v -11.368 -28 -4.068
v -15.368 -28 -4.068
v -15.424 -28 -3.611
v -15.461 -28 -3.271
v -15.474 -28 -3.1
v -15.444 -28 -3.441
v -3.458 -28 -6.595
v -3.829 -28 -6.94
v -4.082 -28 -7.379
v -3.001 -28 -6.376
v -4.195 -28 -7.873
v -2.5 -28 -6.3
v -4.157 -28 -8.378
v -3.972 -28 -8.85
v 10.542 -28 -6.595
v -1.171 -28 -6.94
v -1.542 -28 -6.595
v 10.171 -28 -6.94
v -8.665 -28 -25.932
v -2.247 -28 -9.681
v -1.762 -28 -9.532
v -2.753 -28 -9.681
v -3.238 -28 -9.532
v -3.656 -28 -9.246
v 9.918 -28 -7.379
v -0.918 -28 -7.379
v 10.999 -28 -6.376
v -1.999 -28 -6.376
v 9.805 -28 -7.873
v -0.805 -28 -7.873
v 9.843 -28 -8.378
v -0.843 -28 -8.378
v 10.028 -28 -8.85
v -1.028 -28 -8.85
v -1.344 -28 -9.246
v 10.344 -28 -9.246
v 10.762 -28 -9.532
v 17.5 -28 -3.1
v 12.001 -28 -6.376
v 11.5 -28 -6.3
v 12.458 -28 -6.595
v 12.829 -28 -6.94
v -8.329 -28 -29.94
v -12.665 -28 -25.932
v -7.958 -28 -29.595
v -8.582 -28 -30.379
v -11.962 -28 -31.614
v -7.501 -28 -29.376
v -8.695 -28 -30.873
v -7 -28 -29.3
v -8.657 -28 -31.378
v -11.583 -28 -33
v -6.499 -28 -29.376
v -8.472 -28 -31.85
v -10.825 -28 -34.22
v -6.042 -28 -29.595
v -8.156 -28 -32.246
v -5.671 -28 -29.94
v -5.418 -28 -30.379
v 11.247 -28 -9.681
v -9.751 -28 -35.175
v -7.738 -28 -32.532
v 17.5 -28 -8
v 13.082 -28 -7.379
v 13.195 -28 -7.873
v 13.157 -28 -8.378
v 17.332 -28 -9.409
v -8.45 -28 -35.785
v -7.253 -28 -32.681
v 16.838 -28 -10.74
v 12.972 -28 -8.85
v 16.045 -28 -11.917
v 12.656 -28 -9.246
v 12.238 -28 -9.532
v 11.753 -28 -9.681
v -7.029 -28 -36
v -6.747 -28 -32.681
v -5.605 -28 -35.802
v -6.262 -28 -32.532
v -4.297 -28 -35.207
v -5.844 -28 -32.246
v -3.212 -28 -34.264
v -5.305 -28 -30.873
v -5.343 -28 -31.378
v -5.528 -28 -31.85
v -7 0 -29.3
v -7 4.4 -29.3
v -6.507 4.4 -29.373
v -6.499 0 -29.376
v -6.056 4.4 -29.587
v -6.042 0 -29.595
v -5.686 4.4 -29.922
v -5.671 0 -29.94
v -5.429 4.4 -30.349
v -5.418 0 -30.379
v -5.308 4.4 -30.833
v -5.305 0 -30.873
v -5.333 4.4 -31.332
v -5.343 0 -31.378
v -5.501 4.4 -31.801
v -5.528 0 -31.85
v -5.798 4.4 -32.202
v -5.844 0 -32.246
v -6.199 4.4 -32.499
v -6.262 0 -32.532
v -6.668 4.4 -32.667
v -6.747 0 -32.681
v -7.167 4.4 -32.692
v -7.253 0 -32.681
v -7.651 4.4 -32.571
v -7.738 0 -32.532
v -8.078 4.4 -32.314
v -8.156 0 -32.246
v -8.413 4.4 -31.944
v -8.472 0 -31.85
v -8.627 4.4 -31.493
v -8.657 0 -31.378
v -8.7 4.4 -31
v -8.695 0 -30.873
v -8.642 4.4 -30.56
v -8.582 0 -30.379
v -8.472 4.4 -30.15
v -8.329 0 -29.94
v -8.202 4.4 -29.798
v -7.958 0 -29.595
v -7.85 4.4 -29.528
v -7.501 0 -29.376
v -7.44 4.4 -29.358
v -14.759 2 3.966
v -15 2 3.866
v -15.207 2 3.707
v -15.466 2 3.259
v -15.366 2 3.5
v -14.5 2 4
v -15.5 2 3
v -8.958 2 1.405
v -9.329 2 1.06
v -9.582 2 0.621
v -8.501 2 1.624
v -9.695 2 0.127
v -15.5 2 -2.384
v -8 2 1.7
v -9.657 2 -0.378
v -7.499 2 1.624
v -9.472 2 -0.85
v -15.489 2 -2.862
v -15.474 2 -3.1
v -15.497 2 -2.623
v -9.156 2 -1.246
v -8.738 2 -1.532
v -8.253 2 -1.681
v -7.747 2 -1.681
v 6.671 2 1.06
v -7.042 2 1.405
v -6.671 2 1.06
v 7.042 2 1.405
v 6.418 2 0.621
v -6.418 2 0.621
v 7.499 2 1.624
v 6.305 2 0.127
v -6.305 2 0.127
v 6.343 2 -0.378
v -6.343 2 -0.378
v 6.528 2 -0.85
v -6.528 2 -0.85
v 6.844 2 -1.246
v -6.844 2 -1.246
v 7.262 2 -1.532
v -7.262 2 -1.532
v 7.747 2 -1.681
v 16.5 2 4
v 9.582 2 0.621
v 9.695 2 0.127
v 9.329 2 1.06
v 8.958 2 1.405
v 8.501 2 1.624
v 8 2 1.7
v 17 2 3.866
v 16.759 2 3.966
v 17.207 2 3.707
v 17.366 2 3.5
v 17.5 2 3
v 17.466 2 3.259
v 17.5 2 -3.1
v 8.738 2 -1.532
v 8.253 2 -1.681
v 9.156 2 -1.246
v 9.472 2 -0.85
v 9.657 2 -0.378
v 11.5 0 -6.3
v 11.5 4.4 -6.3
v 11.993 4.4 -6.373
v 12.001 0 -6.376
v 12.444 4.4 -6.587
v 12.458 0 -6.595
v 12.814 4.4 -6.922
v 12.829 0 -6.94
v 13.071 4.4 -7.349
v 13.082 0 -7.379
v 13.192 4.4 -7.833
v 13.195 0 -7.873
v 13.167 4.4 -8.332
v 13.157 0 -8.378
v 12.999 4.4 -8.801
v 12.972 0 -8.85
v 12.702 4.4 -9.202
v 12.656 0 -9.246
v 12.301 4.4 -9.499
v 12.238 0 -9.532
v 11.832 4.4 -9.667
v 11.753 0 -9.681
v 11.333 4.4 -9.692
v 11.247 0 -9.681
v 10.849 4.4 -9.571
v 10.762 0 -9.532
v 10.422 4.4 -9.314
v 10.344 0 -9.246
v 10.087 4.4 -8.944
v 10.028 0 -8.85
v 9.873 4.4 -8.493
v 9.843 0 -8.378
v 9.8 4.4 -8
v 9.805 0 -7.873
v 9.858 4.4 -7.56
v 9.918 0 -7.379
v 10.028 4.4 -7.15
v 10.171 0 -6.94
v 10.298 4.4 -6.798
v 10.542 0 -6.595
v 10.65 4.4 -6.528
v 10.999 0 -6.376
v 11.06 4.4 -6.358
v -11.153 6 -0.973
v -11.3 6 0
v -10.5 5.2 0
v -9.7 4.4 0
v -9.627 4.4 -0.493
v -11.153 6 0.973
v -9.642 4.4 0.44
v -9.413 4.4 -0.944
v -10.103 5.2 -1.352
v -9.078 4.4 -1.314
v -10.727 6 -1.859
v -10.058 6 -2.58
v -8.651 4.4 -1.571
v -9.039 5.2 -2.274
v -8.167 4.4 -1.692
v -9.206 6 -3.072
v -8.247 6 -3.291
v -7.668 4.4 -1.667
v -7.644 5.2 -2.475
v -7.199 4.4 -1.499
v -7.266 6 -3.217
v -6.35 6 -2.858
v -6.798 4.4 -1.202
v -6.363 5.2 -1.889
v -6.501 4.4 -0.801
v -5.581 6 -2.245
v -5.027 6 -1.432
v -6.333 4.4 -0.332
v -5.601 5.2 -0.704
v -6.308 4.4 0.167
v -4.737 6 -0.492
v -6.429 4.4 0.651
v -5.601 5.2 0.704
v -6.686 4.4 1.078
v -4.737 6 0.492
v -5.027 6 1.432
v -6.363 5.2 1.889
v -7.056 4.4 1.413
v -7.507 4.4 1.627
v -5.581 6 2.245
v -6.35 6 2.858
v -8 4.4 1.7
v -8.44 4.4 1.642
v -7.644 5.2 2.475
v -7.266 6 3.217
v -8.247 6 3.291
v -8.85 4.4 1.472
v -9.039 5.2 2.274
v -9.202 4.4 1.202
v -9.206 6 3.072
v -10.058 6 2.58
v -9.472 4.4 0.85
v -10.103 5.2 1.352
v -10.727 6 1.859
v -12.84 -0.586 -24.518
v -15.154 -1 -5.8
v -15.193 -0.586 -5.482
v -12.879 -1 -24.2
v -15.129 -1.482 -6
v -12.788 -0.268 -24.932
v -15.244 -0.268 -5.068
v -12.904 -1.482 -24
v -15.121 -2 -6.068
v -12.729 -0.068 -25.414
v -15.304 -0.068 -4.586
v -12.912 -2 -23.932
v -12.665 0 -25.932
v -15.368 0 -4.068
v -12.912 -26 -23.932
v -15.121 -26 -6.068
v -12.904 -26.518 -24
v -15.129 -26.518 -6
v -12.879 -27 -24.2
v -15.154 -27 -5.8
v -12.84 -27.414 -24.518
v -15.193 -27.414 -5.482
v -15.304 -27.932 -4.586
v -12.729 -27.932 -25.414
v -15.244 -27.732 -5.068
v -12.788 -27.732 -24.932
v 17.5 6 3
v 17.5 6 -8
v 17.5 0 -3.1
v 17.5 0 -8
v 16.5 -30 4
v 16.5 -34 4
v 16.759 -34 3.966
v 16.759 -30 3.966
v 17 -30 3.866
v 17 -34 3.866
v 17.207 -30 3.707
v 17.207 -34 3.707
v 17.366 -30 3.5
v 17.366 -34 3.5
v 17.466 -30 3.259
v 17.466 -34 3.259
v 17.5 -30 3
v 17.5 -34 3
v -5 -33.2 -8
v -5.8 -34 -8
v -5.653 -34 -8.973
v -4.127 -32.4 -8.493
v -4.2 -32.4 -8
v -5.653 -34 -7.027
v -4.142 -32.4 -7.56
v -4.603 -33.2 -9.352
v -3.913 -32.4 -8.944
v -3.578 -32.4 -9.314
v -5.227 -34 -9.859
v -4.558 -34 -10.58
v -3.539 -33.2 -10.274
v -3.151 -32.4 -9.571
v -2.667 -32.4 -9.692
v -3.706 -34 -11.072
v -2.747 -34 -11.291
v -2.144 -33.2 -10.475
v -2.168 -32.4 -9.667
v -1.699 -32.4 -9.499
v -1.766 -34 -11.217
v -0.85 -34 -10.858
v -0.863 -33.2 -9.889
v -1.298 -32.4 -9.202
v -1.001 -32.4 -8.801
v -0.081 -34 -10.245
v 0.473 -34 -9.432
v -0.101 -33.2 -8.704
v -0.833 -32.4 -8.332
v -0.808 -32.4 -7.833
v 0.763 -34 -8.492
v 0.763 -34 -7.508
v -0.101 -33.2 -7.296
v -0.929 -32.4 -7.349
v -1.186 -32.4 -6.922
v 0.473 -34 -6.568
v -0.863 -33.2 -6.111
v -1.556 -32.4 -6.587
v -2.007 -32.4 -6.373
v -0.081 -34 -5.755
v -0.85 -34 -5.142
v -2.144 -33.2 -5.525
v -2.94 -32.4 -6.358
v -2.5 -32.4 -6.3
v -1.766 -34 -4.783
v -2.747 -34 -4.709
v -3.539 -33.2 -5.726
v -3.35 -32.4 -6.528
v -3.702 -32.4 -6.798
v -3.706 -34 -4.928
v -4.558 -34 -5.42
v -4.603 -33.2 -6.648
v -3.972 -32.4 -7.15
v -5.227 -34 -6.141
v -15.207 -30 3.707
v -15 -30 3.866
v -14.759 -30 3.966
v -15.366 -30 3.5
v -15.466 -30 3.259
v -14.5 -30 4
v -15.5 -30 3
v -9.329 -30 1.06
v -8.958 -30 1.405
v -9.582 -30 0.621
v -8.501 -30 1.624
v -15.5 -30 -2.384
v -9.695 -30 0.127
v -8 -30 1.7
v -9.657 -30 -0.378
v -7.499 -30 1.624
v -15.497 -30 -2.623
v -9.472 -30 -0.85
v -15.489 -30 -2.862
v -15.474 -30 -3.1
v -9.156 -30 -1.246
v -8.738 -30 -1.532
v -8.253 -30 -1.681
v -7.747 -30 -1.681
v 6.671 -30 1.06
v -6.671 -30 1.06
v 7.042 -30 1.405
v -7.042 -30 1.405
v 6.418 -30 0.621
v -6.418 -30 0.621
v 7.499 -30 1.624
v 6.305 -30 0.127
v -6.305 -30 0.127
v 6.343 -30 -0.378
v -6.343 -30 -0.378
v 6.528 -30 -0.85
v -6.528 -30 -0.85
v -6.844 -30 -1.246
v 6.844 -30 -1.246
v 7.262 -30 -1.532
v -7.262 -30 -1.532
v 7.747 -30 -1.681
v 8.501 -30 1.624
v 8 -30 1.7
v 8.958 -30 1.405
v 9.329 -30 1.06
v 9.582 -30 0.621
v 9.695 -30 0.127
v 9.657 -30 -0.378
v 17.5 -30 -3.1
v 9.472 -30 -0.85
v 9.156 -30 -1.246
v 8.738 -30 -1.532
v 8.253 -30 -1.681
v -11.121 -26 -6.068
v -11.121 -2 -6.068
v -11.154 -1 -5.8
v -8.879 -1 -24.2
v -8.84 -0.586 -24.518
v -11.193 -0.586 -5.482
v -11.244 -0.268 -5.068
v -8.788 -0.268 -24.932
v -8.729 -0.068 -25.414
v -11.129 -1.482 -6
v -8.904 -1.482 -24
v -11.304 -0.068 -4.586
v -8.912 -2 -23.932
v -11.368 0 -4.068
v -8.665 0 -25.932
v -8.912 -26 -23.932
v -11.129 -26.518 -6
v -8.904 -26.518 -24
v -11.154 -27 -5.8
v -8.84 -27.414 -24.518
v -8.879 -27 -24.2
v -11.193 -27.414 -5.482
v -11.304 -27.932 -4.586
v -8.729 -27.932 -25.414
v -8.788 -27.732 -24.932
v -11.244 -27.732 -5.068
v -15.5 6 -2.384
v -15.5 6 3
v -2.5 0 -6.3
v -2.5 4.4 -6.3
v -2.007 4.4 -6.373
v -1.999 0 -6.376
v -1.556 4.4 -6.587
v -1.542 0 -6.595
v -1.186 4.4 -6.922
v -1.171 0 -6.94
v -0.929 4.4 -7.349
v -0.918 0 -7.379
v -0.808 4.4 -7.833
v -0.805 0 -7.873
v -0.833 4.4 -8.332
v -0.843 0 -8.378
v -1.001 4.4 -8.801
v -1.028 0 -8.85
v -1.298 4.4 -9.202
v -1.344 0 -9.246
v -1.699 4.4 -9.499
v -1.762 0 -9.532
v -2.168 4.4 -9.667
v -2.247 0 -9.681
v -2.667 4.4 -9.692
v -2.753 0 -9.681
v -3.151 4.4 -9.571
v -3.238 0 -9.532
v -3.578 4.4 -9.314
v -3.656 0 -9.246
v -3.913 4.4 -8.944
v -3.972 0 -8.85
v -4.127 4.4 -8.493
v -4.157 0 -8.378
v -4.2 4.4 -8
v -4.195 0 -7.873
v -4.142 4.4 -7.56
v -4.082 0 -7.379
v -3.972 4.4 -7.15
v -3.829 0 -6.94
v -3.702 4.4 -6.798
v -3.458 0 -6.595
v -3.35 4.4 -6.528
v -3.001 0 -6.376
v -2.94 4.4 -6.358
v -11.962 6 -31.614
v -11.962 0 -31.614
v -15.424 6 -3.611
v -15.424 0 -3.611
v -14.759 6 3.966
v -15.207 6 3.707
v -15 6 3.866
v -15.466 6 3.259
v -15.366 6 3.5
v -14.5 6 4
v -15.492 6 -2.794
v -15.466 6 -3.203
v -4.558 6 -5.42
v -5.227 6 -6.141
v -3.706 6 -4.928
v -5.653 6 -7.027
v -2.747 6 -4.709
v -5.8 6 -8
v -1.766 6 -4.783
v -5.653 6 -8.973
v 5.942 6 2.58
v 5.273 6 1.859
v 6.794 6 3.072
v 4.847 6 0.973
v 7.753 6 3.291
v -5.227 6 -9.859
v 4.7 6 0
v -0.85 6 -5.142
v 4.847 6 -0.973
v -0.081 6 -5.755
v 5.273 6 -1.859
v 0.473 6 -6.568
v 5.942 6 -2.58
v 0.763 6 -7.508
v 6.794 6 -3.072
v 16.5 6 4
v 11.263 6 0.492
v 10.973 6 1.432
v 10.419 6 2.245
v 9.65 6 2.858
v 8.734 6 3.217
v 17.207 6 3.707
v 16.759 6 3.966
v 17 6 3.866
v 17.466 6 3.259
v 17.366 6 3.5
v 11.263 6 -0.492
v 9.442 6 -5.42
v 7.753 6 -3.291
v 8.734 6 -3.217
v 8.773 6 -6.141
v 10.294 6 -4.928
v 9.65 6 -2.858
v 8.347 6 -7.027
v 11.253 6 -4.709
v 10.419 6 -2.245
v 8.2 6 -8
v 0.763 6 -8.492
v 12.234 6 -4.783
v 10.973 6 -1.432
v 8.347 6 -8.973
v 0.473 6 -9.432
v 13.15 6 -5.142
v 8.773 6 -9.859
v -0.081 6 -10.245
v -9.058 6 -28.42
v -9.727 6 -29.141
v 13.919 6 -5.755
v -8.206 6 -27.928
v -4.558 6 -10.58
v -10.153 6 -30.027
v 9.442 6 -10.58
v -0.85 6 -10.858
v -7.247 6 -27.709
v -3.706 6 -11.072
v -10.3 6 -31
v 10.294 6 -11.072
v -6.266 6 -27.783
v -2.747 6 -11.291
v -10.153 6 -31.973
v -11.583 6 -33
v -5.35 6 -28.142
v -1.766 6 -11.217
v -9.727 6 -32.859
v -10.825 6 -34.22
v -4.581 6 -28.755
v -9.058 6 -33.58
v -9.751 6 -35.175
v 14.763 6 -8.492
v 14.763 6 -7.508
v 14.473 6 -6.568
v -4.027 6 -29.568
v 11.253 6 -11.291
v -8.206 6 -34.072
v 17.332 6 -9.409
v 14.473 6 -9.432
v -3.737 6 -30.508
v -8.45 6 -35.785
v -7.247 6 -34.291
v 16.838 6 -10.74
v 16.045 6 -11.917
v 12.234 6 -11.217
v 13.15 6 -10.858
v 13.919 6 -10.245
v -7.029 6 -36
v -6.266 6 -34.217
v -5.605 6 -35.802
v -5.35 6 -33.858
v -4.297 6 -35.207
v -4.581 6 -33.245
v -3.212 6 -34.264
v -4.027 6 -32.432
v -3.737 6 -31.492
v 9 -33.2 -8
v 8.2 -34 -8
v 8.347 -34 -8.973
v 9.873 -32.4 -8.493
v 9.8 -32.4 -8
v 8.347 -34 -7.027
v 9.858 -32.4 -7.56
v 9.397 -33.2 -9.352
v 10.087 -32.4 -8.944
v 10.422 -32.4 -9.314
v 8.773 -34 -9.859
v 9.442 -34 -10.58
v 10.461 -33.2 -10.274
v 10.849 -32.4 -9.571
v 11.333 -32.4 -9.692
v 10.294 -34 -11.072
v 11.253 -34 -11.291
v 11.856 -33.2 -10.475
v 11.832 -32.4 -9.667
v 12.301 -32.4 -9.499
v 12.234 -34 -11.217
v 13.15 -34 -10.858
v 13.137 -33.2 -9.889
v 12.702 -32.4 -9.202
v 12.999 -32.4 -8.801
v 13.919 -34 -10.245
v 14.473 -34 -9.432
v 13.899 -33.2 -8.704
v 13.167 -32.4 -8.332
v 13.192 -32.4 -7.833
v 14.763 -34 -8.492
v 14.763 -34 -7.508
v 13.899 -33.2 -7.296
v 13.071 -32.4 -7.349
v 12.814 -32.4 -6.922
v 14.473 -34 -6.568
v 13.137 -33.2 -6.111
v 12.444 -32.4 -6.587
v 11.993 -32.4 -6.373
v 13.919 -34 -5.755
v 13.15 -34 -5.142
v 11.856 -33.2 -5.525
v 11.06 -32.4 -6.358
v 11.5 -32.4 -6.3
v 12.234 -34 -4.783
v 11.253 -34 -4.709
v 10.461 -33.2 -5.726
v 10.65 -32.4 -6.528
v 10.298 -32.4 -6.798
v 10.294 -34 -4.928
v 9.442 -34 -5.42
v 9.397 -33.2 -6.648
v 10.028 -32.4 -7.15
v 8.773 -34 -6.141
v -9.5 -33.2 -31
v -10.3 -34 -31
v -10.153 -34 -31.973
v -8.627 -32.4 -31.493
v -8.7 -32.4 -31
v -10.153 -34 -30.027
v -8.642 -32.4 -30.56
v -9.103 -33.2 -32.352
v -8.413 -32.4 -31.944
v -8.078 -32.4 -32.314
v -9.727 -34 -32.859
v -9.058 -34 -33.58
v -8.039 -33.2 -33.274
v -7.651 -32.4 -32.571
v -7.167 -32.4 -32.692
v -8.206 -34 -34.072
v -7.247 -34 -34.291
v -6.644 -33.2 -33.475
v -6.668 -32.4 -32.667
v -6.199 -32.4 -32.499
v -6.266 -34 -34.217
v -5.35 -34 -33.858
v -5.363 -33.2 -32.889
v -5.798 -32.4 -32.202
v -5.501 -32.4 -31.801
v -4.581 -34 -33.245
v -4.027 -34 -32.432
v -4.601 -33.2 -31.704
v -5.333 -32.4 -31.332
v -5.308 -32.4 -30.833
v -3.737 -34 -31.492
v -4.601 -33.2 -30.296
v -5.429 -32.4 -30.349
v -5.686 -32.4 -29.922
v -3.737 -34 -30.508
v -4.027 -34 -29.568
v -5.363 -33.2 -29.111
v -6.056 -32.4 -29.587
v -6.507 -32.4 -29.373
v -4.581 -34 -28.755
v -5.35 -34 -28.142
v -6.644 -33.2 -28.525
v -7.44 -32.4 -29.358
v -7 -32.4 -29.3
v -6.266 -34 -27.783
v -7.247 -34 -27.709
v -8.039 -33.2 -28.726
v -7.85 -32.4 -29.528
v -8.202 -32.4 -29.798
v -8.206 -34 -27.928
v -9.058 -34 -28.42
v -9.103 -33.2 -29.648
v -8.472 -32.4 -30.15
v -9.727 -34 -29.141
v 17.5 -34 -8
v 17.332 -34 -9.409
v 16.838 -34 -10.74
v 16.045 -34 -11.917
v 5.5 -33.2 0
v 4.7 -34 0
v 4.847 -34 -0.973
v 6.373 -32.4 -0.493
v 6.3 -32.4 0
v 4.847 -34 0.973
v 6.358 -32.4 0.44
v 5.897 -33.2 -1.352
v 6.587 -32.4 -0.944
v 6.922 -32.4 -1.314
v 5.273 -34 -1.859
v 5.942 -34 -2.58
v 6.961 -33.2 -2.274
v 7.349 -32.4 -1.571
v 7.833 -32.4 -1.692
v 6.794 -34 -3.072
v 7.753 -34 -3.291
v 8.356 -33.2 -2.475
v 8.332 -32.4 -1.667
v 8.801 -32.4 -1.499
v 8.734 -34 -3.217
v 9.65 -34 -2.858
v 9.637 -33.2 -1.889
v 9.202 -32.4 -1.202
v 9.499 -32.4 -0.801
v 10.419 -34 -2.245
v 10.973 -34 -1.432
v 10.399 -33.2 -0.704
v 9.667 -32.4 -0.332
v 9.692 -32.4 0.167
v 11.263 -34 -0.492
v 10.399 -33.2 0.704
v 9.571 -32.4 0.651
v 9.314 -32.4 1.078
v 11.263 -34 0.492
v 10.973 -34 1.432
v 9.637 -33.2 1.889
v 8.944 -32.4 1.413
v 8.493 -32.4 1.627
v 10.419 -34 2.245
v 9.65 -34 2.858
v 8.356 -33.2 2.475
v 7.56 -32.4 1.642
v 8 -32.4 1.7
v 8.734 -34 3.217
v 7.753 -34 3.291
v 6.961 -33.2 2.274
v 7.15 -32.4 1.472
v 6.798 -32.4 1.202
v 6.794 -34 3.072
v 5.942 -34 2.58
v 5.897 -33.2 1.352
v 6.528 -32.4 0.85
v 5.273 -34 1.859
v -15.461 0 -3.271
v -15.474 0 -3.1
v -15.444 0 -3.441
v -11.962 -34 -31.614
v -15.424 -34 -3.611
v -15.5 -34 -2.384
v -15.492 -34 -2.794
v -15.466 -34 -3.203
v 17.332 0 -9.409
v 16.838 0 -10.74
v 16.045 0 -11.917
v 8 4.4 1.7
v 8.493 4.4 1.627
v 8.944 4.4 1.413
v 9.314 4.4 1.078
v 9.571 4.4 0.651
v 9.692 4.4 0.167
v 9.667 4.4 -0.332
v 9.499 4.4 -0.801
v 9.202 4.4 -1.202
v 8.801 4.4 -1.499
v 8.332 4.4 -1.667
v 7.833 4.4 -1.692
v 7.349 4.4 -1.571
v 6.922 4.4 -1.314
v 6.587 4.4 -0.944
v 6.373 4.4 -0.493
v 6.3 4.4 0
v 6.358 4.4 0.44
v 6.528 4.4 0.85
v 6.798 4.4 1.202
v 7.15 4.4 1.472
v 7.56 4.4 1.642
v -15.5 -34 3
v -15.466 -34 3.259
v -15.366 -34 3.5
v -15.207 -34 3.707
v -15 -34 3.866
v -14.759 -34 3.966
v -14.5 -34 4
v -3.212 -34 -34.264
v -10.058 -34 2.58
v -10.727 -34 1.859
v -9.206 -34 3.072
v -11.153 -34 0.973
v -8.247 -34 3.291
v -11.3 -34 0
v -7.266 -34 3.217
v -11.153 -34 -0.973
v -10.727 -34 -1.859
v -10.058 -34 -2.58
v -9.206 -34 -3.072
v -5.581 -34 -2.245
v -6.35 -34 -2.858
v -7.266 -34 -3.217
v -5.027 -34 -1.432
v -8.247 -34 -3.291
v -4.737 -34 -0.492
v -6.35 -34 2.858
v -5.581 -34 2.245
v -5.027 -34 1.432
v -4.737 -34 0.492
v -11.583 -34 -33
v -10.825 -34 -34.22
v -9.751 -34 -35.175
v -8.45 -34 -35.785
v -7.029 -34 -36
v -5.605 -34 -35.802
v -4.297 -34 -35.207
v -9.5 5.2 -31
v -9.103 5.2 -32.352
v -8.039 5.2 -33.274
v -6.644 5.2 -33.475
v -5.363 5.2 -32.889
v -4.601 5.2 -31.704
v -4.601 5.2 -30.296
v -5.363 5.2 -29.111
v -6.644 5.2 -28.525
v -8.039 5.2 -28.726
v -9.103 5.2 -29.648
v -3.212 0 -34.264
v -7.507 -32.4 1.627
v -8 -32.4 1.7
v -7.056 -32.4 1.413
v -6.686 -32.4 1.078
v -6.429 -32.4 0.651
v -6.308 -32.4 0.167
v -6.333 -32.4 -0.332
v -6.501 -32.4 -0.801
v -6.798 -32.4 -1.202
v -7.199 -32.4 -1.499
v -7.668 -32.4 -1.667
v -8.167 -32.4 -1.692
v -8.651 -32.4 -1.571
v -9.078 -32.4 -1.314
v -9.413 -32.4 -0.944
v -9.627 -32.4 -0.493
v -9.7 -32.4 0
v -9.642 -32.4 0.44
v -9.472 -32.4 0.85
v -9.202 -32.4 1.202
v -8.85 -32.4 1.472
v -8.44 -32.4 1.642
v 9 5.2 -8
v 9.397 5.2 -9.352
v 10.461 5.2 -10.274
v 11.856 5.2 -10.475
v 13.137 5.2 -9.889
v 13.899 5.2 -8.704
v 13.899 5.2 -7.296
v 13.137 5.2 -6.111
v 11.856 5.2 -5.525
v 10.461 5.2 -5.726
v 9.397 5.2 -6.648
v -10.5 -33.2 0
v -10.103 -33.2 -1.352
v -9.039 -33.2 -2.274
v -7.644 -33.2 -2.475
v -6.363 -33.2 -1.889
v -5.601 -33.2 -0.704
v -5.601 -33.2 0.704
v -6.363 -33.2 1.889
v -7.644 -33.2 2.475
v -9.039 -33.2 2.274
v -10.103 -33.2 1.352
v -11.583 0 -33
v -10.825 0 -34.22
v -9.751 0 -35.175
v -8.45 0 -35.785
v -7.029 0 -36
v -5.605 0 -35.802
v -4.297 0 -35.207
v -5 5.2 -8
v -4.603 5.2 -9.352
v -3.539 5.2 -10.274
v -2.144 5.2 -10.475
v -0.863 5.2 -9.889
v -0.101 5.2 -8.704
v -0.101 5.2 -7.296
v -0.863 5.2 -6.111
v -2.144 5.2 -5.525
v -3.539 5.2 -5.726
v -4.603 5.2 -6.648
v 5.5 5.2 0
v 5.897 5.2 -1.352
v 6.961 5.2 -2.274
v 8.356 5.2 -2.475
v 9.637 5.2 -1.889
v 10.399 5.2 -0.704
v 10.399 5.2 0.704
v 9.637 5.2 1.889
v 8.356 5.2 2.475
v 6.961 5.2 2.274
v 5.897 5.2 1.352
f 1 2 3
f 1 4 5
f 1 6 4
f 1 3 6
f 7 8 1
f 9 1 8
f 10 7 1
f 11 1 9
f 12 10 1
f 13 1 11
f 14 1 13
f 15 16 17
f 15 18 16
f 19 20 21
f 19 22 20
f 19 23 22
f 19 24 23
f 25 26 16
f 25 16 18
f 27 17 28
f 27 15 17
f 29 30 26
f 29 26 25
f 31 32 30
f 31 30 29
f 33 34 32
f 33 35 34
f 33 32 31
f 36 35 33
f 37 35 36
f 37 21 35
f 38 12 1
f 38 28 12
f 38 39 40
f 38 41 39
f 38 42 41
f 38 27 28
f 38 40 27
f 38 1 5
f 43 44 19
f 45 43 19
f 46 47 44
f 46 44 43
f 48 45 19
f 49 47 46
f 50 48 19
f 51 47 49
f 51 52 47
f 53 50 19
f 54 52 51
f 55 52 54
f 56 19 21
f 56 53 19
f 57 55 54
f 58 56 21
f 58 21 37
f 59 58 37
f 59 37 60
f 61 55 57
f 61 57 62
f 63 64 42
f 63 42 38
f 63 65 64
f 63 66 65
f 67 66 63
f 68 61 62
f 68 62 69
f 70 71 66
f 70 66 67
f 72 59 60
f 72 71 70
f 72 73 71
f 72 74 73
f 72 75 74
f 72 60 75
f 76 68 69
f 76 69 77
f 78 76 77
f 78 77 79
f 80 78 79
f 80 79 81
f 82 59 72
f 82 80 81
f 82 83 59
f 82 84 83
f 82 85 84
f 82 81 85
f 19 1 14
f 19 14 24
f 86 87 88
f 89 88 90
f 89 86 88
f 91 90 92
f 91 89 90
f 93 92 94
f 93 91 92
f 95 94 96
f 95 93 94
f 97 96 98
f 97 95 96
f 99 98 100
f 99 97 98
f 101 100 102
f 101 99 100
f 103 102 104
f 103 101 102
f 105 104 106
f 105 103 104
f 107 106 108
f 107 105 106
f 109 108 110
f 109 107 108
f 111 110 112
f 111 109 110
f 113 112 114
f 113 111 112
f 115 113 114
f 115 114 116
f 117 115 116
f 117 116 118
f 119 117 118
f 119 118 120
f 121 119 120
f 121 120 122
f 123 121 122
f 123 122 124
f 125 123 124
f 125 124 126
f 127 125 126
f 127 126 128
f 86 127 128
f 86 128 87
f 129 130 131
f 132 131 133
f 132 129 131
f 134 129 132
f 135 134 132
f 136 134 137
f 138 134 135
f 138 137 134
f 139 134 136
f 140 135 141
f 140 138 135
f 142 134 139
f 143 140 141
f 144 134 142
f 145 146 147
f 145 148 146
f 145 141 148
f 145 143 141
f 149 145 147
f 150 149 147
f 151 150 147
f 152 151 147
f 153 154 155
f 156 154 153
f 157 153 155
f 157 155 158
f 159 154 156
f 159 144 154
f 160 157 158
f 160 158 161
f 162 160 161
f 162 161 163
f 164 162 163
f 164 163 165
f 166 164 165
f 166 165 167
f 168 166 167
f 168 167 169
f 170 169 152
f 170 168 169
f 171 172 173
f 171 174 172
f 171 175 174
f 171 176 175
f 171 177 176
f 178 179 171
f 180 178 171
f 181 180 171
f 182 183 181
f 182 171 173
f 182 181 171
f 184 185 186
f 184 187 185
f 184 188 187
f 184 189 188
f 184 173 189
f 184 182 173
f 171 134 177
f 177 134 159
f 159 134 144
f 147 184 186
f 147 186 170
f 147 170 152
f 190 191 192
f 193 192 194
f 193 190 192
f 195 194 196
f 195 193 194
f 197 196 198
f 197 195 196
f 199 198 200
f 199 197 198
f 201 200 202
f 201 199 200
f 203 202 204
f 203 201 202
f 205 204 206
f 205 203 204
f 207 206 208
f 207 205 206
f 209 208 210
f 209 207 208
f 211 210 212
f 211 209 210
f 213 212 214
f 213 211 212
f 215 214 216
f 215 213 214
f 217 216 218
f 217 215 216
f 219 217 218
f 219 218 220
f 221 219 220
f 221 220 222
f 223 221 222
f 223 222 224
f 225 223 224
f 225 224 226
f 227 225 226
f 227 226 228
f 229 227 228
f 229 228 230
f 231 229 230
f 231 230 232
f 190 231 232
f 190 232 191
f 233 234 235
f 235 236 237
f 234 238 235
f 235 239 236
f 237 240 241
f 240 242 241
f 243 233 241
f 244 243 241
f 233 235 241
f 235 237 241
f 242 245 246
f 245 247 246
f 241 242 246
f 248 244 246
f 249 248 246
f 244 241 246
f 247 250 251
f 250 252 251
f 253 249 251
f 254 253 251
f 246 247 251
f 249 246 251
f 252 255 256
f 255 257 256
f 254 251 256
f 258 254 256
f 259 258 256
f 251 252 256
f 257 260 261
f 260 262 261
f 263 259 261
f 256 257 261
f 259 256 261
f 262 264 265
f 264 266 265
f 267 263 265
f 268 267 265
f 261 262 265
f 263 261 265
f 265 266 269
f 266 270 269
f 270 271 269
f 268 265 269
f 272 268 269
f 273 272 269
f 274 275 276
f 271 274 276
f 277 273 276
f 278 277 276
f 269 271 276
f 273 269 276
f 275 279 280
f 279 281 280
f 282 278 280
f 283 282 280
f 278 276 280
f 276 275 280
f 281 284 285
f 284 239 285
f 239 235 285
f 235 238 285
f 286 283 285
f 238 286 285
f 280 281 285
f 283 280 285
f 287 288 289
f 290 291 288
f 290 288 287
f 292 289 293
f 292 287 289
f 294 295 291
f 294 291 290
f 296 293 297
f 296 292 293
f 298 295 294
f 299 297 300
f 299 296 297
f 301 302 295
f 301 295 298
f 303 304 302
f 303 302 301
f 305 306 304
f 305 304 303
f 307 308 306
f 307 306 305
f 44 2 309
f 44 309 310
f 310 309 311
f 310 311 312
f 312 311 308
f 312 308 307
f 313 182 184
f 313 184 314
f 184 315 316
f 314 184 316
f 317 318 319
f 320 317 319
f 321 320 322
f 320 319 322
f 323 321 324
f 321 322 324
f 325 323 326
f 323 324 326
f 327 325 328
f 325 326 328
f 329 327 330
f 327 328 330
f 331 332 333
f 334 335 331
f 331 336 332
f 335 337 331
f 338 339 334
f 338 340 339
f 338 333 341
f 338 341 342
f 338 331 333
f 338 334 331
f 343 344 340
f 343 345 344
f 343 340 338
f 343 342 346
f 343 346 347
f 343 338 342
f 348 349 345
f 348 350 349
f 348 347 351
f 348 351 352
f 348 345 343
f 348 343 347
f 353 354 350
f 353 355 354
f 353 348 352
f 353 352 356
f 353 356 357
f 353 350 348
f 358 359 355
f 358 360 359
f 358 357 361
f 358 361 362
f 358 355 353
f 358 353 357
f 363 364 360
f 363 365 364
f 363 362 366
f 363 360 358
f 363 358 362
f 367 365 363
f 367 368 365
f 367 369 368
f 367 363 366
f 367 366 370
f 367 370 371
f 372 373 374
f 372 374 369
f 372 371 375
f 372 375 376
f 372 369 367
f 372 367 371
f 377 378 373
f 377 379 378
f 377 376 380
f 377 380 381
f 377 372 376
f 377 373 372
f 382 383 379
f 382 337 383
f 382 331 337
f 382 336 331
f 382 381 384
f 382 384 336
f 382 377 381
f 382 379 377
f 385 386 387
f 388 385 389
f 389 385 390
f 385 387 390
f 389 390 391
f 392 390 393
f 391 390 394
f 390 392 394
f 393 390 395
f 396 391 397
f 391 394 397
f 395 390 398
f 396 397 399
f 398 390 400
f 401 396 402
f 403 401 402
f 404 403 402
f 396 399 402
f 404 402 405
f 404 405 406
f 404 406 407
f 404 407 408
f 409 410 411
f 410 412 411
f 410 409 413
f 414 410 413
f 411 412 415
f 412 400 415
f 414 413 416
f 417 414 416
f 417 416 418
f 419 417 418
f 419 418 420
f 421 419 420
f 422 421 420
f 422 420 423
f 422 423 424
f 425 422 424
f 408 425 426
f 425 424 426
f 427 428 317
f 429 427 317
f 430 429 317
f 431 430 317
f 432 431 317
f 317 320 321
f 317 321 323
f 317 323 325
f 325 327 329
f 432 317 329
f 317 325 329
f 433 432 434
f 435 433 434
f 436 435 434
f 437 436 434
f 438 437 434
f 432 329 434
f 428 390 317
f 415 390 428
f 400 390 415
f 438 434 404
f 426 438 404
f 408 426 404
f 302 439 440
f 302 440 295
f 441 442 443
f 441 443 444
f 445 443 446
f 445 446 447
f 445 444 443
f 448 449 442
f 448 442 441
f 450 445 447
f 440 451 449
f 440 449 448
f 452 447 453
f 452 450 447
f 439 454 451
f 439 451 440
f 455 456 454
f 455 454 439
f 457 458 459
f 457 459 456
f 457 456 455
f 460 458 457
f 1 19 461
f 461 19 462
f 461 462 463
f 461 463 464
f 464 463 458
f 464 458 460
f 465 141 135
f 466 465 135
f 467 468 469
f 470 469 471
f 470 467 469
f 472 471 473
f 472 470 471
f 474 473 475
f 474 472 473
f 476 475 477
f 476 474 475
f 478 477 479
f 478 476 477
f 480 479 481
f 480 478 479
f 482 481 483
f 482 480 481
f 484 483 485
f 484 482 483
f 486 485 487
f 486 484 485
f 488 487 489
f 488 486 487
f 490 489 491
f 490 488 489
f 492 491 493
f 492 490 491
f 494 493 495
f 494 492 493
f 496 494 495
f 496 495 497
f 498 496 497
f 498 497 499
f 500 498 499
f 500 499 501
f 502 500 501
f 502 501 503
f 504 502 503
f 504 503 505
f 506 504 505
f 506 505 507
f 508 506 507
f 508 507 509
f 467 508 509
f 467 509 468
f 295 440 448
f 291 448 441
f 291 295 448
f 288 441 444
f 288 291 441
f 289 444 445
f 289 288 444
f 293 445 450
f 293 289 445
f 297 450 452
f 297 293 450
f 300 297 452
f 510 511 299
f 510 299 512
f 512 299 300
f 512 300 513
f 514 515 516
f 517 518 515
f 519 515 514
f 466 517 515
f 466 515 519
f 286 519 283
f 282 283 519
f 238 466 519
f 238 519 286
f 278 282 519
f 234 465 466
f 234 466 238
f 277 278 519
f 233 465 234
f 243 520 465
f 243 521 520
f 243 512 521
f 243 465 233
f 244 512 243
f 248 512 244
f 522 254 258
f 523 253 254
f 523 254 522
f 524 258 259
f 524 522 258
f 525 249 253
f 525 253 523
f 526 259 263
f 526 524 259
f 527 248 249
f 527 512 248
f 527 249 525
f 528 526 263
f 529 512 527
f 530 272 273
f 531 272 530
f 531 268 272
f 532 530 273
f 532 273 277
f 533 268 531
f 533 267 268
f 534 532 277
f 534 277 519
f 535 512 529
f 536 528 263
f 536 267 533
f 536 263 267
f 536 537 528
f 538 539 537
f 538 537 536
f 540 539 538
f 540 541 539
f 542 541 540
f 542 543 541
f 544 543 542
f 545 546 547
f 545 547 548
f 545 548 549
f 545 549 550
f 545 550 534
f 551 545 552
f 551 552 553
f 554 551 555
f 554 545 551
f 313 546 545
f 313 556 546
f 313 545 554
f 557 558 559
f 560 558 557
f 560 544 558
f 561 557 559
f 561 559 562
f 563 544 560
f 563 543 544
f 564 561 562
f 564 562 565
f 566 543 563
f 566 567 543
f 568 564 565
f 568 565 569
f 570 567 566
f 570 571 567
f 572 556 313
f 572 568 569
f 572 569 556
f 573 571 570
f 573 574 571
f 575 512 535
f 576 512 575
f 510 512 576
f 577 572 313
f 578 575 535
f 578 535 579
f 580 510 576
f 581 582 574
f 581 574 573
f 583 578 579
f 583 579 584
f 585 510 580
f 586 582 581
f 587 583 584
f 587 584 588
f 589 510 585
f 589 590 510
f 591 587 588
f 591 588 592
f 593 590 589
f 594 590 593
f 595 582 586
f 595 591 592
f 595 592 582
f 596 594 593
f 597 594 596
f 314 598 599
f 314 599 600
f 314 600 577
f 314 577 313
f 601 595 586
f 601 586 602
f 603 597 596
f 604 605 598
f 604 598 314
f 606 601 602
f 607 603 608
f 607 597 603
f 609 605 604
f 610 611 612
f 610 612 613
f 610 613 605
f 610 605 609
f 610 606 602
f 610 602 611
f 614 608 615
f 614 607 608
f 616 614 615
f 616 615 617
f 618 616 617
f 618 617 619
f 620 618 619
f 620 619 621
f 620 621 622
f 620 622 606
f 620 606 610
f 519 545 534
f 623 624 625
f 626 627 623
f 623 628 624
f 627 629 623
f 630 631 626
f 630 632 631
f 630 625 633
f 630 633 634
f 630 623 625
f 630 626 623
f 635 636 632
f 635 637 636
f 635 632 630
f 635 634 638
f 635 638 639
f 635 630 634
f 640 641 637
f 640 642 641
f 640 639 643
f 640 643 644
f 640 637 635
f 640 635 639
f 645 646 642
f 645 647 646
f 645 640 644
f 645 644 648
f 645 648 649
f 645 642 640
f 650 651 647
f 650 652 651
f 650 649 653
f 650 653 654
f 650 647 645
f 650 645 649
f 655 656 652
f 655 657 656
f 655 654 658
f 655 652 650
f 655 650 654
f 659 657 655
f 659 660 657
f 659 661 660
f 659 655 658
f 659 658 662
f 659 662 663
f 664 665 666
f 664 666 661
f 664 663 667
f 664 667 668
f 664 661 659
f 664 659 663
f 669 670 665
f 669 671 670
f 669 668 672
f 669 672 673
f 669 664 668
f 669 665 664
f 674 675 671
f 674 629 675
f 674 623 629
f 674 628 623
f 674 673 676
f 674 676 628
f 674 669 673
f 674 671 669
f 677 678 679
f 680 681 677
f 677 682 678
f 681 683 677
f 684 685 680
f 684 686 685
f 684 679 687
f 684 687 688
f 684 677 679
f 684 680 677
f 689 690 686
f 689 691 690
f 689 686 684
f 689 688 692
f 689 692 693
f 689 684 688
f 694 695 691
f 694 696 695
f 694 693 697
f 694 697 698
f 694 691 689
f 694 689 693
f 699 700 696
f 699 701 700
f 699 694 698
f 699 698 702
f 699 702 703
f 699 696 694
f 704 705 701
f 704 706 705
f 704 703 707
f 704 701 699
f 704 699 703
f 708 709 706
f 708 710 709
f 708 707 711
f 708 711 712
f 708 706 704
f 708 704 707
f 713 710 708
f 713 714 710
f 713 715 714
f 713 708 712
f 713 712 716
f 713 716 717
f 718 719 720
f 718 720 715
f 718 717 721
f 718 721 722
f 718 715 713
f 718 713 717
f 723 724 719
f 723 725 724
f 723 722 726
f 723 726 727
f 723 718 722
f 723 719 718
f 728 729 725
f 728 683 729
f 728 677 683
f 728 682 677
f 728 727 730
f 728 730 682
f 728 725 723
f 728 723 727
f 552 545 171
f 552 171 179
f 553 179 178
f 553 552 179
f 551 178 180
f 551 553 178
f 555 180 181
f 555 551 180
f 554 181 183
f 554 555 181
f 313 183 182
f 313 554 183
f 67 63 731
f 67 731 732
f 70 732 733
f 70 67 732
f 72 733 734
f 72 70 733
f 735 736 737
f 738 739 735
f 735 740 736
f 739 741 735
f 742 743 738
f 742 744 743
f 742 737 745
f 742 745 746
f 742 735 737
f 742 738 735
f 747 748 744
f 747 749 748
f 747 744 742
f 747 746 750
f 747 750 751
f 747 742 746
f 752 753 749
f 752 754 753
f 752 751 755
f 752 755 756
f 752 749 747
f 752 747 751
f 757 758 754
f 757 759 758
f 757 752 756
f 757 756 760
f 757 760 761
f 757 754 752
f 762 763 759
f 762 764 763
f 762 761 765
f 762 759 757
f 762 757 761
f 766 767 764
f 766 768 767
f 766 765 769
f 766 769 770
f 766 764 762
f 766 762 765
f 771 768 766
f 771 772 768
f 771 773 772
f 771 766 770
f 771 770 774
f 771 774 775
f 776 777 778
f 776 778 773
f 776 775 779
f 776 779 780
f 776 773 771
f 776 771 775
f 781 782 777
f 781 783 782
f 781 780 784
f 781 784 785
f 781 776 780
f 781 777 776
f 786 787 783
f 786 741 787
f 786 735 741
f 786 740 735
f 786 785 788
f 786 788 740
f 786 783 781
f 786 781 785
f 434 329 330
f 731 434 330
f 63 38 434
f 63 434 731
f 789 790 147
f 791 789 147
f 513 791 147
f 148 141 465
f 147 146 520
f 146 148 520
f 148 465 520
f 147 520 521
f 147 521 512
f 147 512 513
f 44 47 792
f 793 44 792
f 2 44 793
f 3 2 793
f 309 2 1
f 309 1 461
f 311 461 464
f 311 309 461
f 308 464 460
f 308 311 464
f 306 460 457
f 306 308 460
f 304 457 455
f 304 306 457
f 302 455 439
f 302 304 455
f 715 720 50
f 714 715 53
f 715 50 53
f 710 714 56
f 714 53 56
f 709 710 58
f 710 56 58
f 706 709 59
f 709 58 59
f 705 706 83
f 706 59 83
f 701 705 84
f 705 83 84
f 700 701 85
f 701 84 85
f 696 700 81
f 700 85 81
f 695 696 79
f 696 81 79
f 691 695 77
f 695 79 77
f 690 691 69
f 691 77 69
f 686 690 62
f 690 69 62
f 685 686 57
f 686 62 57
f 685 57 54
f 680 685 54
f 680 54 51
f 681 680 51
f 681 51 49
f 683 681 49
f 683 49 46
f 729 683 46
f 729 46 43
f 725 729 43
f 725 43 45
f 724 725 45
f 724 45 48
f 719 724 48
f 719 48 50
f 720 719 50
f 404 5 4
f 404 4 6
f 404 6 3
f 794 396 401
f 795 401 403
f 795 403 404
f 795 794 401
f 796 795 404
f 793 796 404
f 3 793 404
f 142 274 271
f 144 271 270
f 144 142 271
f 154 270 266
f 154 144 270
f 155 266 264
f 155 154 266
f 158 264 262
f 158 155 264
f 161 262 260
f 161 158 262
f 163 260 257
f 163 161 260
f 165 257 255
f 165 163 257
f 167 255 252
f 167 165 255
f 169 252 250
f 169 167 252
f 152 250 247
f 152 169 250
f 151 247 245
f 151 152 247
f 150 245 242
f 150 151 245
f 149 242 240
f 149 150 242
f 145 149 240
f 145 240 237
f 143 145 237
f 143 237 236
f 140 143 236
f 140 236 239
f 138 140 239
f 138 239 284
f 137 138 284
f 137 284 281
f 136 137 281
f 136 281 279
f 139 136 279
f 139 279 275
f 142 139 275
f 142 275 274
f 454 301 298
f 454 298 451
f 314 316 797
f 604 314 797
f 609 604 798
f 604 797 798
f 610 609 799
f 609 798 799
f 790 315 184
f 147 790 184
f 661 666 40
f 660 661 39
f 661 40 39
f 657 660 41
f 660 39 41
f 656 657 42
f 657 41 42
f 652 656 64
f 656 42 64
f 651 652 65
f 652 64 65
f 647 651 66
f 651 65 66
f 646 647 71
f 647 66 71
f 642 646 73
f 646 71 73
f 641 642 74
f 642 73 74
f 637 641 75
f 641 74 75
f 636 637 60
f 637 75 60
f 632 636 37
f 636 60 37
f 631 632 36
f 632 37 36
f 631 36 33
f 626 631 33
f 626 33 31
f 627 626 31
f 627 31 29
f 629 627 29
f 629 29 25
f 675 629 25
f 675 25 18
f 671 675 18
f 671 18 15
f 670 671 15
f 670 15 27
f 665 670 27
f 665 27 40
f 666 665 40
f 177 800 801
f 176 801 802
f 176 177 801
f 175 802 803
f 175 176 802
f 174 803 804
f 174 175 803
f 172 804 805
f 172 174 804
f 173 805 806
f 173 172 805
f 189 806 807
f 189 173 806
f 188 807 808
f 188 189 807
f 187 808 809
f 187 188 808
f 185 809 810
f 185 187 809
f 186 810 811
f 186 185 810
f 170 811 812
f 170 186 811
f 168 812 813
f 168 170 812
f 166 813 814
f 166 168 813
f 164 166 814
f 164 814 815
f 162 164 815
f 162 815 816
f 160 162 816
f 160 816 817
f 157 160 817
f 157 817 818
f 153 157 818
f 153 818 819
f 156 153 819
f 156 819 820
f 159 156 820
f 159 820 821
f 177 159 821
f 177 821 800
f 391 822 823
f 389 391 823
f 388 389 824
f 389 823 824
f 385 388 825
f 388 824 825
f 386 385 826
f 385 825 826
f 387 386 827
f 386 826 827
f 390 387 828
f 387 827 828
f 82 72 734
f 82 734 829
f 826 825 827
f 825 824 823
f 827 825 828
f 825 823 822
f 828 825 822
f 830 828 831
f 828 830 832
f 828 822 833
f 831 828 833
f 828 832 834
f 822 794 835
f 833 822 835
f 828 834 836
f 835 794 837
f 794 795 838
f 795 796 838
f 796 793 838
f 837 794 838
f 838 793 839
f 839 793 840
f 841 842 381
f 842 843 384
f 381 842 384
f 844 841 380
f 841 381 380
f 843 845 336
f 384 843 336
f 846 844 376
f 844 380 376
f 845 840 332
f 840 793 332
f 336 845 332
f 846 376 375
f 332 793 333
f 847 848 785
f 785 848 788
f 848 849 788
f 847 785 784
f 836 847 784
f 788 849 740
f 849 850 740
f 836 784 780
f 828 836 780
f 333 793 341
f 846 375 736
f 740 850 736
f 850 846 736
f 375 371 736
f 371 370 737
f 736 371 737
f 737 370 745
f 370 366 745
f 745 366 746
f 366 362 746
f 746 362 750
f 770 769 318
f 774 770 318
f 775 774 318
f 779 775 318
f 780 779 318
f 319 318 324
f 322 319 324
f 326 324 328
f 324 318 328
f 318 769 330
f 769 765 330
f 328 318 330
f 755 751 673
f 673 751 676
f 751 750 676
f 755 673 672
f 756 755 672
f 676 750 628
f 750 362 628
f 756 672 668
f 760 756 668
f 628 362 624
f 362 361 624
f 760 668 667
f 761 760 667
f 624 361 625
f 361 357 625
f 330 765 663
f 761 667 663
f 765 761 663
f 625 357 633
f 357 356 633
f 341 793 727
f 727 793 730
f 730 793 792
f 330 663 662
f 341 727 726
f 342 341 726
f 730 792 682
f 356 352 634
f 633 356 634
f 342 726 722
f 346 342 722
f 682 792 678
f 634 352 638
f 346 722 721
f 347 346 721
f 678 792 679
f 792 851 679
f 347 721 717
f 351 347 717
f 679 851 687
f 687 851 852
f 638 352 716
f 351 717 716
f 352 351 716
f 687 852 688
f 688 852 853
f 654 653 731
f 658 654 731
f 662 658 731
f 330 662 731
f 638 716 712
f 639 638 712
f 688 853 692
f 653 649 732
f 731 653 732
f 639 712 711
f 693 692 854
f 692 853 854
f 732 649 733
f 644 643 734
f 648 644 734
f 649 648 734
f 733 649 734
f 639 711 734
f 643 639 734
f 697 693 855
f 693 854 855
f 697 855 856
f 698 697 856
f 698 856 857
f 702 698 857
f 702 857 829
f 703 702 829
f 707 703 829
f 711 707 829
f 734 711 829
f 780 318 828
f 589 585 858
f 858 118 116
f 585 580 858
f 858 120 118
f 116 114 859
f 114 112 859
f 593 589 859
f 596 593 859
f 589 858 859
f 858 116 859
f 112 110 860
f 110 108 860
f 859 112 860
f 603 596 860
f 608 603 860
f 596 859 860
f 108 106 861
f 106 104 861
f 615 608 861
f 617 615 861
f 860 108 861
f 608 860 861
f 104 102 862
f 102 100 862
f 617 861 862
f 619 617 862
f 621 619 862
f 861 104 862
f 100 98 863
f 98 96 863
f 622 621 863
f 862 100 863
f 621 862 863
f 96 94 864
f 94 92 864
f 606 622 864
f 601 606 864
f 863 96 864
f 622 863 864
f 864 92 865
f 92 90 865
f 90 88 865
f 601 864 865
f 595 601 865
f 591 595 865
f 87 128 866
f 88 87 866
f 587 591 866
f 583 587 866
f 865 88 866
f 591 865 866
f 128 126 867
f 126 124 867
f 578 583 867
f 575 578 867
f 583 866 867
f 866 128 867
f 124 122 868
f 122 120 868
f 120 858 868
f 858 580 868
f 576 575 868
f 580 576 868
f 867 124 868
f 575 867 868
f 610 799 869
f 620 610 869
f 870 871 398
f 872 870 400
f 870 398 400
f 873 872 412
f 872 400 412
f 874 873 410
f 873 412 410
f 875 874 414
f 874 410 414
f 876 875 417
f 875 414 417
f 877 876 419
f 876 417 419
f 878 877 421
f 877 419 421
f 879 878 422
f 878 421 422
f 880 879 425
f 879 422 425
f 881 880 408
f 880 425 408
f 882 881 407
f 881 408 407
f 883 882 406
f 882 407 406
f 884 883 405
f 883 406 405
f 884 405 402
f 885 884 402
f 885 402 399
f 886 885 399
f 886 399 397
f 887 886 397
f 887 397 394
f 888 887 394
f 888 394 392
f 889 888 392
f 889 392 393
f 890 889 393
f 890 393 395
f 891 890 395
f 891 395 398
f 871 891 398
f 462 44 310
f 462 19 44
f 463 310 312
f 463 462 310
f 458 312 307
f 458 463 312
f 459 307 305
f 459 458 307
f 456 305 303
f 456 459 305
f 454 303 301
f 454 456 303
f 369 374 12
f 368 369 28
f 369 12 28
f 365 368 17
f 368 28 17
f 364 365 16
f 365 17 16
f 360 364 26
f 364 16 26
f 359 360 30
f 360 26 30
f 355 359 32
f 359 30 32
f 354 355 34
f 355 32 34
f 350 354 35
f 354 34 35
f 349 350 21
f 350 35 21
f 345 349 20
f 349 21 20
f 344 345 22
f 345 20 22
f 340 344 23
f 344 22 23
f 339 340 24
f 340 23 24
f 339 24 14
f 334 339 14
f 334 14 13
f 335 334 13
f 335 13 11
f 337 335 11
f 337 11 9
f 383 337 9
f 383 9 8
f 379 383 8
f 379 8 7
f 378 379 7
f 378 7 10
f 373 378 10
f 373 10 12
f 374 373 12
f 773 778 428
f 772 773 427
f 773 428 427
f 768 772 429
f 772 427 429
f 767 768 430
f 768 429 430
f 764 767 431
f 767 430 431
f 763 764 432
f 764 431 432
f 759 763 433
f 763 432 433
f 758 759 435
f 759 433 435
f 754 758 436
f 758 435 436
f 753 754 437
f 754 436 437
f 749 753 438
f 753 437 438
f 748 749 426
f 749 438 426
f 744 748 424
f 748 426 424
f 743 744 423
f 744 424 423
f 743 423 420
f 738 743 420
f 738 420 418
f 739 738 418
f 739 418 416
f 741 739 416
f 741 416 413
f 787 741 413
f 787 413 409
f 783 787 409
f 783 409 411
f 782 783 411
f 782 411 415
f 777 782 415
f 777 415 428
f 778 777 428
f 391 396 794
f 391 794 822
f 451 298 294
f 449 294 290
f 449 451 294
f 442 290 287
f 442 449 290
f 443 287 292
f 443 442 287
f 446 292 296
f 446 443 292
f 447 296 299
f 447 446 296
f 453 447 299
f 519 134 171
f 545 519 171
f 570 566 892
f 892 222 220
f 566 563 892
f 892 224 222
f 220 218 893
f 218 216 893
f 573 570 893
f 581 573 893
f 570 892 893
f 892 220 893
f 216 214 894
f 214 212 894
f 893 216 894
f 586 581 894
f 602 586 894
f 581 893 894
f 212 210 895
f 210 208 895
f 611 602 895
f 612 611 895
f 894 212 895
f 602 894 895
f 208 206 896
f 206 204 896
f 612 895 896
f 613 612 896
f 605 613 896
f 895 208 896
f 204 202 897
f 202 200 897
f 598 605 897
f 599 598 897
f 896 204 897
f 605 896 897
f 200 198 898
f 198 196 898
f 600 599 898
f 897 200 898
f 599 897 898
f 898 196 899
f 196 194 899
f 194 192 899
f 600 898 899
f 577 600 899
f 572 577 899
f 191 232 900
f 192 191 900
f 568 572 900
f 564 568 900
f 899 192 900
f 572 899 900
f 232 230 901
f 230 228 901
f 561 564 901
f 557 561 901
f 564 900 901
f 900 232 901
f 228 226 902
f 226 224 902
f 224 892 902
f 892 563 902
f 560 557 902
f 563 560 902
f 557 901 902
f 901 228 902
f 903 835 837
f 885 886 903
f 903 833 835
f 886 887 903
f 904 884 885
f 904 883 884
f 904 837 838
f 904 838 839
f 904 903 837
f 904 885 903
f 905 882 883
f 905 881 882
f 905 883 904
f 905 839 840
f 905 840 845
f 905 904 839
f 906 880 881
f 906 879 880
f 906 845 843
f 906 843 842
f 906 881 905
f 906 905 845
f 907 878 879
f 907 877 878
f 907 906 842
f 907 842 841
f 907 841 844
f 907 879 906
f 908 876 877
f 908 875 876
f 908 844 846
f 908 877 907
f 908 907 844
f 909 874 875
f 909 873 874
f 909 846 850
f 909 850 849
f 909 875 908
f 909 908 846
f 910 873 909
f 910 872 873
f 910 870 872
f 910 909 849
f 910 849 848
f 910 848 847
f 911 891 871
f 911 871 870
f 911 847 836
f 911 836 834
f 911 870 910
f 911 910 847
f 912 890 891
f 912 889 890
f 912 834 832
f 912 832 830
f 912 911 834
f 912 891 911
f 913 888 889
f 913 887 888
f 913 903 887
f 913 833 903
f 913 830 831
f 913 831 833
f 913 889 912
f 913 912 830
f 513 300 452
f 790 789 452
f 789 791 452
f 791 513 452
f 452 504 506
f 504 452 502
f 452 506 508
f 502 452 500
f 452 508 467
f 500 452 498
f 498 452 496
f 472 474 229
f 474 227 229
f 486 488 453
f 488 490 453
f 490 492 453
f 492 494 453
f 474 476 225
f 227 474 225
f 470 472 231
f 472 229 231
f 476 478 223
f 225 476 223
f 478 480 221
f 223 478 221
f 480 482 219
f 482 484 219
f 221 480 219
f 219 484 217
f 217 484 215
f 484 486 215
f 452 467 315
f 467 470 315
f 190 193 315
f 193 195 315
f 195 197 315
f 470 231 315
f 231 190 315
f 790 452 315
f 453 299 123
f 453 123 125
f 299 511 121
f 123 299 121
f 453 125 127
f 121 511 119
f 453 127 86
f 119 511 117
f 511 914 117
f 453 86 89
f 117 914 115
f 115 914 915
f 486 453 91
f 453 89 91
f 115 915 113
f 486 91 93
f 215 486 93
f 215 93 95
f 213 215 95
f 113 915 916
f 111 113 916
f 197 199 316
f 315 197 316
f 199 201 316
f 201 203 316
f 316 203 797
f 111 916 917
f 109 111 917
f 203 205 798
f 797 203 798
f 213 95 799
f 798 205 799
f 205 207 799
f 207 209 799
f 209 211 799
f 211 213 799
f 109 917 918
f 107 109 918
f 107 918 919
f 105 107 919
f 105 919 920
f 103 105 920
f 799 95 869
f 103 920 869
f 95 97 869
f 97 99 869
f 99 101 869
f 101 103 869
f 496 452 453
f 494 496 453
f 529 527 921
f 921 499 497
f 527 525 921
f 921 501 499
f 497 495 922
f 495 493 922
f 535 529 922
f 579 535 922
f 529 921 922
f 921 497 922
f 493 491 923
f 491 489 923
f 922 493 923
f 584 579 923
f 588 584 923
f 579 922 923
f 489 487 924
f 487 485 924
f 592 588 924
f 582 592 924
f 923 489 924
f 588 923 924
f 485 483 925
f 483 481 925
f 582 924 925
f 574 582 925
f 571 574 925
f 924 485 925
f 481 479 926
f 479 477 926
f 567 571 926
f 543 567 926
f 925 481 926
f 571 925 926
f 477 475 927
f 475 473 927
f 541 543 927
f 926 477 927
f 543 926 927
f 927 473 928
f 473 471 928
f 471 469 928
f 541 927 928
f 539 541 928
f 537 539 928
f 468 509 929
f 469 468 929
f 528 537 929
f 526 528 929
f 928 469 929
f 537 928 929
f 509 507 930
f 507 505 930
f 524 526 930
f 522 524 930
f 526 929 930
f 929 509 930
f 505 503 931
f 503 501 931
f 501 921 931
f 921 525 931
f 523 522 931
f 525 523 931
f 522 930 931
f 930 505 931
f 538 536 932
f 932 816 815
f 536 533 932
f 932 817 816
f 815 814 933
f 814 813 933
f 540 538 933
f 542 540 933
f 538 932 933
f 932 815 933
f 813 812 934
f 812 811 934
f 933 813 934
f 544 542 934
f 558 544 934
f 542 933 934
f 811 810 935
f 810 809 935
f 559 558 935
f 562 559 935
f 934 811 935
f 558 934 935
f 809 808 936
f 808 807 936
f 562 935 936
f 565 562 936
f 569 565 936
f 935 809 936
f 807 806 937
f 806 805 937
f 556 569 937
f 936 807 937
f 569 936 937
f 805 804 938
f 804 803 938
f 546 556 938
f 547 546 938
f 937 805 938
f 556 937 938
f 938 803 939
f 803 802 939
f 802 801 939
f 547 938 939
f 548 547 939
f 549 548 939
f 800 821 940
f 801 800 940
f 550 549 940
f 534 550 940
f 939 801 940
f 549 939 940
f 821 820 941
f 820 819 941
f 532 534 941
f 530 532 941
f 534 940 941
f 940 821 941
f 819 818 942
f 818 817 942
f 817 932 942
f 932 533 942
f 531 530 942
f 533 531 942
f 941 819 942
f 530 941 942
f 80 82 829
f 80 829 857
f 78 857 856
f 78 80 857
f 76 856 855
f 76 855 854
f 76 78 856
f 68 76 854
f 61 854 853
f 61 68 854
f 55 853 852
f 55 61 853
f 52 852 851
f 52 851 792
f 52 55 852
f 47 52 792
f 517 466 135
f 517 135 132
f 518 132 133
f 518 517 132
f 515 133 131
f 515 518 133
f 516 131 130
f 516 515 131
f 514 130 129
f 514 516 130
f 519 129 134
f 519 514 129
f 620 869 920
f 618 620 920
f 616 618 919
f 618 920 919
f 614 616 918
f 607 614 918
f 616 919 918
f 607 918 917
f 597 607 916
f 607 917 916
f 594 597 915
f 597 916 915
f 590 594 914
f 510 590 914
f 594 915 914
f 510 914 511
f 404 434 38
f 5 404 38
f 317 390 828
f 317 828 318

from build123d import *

# Parameters (mm, degrees)
SKETCH_1_R                   = 1.7
EXTRUDE_1_DEPTH              = 6
EXTRUDE_3_DEPTH              = 14
FILLET_1_R                   = 1
FILLET_2_R                   = 10
HOLE_WIZARD_M3_1_D           = 3.4
HOLE_WIZARD_M3_1_DEPTH       = 20
HOLE_WIZARD_M3_1_CSINK_D     = 6.6
HOLE_WIZARD_M3_1_CSINK_ANGLE = 90
SKETCH_14_W                  = 15
SKETCH_14_H                  = 32
CUT_EXTRUDE_3_DEPTH          = 60.506302187
FILLET_3_R                   = 2


with BuildPart() as part:
    # 草图1 → 凸台-拉伸1 (new body)
    with BuildSketch(Plane(origin=(0, 0, 0), x_dir=(1, 0, 0), z_dir=(0, 1, 0))):
        with BuildLine():
            Line((-15.5, 3), (-15.5, -4))
            Line((-15.5, -4), (15.5, -4))
            Line((15.5, -4), (17.5, -4))
            Line((17.5, -4), (17.5, 8))
            ThreePointArc((17.5, 8), (17.124551632, 10.089119178), (16.045193687, 11.916786227))
            Line((16.045193687, 11.916786227), (-3.212338594, 34.263988522))
            ThreePointArc((-3.212338594, 34.263988522), (-8.449526575, 35.78527666), (-11.962215367, 31.613529665))
            Line((-11.962215367, 31.613529665), (-15.5, 3))
        make_face()
        with Locations(Location((-8, 0, 0), (0, 0, 270))):
            Circle(SKETCH_1_R, mode=Mode.SUBTRACT)
        with Locations(Location((-2.5, 8, 0), (0, 0, 270))):
            Circle(SKETCH_1_R, mode=Mode.SUBTRACT)
        with Locations(Location((8, 0, 0), (0, 0, 270))):
            Circle(SKETCH_1_R, mode=Mode.SUBTRACT)
        with Locations(Location((11.5, 8, 0), (0, 0, 270))):
            Circle(SKETCH_1_R, mode=Mode.SUBTRACT)
        with Locations(Location((-7, 31, 0), (0, 0, 270))):
            Circle(SKETCH_1_R, mode=Mode.SUBTRACT)
    extrude(amount=EXTRUDE_1_DEPTH)

    # 草图3 → 凸台-拉伸3 (add)
    with BuildSketch(Plane.XZ):
        Polygon((-15.120670115, -6.068012339), (-12.911963321, -23.931987661), (-8.911963321, -23.931987661), (-11.120670115, -6.068012339), align=None)
    extrude(amount=EXTRUDE_3_DEPTH)

    # 圆角1
    fillet_1_edges = [part.edges().sort_by_distance(p)[0] for p in [
        (17.5, 3, 4),
        (-15.5, 3, 4),
    ]]
    fillet(fillet_1_edges, radius=FILLET_1_R)

    # 圆角2
    fillet_2_edges = [part.edges().sort_by_distance(p)[0] for p in [
        (-15.5, 3, -3),
    ]]
    fillet(fillet_2_edges, radius=FILLET_2_R)

    # M3 十字槽半沉头木螺钉的锥形沉头孔1
    with Locations(Plane(origin=(0, 6, 0), x_dir=(1, 0, 0), z_dir=(0, 1, 0))):
        with Locations((-2.5, 8), (11.5, 8), (8, 0), (-8, 0), (-7, 31)):
            CounterSinkHole(HOLE_WIZARD_M3_1_D / 2, HOLE_WIZARD_M3_1_CSINK_D / 2, depth=HOLE_WIZARD_M3_1_DEPTH, counter_sink_angle=HOLE_WIZARD_M3_1_CSINK_ANGLE)

    # 镜向1: part across plane


with BuildPart() as part_1:
    add(part.part)
    add(part.part.mirror(Plane(origin=(0, -14, 0), x_dir=(0, 0, 1), z_dir=(0, -1, 0))))

    # 草图14 → 切除-拉伸3 (cut, through all)
    with BuildSketch(Plane(origin=(17.5, 0, 0), x_dir=(0, 0, -1), z_dir=(1, 0, 0))):
        with Locations((-4.4, -14)):
            Rectangle(SKETCH_14_W, SKETCH_14_H)
    extrude(amount=-CUT_EXTRUDE_3_DEPTH, mode=Mode.SUBTRACT)

    # 圆角3
    fillet_3_edges = [part_1.edges().sort_by_distance(p)[0] for p in [
        (-10.911963321, -28, -23.931987661),
        (-13.120670115, -28, -6.068012339),
        (-13.120670115, 0, -6.068012339),
        (-10.911963321, 0, -23.931987661),
    ]]
    fillet(fillet_3_edges, radius=FILLET_3_R)


solid = part_1.part
